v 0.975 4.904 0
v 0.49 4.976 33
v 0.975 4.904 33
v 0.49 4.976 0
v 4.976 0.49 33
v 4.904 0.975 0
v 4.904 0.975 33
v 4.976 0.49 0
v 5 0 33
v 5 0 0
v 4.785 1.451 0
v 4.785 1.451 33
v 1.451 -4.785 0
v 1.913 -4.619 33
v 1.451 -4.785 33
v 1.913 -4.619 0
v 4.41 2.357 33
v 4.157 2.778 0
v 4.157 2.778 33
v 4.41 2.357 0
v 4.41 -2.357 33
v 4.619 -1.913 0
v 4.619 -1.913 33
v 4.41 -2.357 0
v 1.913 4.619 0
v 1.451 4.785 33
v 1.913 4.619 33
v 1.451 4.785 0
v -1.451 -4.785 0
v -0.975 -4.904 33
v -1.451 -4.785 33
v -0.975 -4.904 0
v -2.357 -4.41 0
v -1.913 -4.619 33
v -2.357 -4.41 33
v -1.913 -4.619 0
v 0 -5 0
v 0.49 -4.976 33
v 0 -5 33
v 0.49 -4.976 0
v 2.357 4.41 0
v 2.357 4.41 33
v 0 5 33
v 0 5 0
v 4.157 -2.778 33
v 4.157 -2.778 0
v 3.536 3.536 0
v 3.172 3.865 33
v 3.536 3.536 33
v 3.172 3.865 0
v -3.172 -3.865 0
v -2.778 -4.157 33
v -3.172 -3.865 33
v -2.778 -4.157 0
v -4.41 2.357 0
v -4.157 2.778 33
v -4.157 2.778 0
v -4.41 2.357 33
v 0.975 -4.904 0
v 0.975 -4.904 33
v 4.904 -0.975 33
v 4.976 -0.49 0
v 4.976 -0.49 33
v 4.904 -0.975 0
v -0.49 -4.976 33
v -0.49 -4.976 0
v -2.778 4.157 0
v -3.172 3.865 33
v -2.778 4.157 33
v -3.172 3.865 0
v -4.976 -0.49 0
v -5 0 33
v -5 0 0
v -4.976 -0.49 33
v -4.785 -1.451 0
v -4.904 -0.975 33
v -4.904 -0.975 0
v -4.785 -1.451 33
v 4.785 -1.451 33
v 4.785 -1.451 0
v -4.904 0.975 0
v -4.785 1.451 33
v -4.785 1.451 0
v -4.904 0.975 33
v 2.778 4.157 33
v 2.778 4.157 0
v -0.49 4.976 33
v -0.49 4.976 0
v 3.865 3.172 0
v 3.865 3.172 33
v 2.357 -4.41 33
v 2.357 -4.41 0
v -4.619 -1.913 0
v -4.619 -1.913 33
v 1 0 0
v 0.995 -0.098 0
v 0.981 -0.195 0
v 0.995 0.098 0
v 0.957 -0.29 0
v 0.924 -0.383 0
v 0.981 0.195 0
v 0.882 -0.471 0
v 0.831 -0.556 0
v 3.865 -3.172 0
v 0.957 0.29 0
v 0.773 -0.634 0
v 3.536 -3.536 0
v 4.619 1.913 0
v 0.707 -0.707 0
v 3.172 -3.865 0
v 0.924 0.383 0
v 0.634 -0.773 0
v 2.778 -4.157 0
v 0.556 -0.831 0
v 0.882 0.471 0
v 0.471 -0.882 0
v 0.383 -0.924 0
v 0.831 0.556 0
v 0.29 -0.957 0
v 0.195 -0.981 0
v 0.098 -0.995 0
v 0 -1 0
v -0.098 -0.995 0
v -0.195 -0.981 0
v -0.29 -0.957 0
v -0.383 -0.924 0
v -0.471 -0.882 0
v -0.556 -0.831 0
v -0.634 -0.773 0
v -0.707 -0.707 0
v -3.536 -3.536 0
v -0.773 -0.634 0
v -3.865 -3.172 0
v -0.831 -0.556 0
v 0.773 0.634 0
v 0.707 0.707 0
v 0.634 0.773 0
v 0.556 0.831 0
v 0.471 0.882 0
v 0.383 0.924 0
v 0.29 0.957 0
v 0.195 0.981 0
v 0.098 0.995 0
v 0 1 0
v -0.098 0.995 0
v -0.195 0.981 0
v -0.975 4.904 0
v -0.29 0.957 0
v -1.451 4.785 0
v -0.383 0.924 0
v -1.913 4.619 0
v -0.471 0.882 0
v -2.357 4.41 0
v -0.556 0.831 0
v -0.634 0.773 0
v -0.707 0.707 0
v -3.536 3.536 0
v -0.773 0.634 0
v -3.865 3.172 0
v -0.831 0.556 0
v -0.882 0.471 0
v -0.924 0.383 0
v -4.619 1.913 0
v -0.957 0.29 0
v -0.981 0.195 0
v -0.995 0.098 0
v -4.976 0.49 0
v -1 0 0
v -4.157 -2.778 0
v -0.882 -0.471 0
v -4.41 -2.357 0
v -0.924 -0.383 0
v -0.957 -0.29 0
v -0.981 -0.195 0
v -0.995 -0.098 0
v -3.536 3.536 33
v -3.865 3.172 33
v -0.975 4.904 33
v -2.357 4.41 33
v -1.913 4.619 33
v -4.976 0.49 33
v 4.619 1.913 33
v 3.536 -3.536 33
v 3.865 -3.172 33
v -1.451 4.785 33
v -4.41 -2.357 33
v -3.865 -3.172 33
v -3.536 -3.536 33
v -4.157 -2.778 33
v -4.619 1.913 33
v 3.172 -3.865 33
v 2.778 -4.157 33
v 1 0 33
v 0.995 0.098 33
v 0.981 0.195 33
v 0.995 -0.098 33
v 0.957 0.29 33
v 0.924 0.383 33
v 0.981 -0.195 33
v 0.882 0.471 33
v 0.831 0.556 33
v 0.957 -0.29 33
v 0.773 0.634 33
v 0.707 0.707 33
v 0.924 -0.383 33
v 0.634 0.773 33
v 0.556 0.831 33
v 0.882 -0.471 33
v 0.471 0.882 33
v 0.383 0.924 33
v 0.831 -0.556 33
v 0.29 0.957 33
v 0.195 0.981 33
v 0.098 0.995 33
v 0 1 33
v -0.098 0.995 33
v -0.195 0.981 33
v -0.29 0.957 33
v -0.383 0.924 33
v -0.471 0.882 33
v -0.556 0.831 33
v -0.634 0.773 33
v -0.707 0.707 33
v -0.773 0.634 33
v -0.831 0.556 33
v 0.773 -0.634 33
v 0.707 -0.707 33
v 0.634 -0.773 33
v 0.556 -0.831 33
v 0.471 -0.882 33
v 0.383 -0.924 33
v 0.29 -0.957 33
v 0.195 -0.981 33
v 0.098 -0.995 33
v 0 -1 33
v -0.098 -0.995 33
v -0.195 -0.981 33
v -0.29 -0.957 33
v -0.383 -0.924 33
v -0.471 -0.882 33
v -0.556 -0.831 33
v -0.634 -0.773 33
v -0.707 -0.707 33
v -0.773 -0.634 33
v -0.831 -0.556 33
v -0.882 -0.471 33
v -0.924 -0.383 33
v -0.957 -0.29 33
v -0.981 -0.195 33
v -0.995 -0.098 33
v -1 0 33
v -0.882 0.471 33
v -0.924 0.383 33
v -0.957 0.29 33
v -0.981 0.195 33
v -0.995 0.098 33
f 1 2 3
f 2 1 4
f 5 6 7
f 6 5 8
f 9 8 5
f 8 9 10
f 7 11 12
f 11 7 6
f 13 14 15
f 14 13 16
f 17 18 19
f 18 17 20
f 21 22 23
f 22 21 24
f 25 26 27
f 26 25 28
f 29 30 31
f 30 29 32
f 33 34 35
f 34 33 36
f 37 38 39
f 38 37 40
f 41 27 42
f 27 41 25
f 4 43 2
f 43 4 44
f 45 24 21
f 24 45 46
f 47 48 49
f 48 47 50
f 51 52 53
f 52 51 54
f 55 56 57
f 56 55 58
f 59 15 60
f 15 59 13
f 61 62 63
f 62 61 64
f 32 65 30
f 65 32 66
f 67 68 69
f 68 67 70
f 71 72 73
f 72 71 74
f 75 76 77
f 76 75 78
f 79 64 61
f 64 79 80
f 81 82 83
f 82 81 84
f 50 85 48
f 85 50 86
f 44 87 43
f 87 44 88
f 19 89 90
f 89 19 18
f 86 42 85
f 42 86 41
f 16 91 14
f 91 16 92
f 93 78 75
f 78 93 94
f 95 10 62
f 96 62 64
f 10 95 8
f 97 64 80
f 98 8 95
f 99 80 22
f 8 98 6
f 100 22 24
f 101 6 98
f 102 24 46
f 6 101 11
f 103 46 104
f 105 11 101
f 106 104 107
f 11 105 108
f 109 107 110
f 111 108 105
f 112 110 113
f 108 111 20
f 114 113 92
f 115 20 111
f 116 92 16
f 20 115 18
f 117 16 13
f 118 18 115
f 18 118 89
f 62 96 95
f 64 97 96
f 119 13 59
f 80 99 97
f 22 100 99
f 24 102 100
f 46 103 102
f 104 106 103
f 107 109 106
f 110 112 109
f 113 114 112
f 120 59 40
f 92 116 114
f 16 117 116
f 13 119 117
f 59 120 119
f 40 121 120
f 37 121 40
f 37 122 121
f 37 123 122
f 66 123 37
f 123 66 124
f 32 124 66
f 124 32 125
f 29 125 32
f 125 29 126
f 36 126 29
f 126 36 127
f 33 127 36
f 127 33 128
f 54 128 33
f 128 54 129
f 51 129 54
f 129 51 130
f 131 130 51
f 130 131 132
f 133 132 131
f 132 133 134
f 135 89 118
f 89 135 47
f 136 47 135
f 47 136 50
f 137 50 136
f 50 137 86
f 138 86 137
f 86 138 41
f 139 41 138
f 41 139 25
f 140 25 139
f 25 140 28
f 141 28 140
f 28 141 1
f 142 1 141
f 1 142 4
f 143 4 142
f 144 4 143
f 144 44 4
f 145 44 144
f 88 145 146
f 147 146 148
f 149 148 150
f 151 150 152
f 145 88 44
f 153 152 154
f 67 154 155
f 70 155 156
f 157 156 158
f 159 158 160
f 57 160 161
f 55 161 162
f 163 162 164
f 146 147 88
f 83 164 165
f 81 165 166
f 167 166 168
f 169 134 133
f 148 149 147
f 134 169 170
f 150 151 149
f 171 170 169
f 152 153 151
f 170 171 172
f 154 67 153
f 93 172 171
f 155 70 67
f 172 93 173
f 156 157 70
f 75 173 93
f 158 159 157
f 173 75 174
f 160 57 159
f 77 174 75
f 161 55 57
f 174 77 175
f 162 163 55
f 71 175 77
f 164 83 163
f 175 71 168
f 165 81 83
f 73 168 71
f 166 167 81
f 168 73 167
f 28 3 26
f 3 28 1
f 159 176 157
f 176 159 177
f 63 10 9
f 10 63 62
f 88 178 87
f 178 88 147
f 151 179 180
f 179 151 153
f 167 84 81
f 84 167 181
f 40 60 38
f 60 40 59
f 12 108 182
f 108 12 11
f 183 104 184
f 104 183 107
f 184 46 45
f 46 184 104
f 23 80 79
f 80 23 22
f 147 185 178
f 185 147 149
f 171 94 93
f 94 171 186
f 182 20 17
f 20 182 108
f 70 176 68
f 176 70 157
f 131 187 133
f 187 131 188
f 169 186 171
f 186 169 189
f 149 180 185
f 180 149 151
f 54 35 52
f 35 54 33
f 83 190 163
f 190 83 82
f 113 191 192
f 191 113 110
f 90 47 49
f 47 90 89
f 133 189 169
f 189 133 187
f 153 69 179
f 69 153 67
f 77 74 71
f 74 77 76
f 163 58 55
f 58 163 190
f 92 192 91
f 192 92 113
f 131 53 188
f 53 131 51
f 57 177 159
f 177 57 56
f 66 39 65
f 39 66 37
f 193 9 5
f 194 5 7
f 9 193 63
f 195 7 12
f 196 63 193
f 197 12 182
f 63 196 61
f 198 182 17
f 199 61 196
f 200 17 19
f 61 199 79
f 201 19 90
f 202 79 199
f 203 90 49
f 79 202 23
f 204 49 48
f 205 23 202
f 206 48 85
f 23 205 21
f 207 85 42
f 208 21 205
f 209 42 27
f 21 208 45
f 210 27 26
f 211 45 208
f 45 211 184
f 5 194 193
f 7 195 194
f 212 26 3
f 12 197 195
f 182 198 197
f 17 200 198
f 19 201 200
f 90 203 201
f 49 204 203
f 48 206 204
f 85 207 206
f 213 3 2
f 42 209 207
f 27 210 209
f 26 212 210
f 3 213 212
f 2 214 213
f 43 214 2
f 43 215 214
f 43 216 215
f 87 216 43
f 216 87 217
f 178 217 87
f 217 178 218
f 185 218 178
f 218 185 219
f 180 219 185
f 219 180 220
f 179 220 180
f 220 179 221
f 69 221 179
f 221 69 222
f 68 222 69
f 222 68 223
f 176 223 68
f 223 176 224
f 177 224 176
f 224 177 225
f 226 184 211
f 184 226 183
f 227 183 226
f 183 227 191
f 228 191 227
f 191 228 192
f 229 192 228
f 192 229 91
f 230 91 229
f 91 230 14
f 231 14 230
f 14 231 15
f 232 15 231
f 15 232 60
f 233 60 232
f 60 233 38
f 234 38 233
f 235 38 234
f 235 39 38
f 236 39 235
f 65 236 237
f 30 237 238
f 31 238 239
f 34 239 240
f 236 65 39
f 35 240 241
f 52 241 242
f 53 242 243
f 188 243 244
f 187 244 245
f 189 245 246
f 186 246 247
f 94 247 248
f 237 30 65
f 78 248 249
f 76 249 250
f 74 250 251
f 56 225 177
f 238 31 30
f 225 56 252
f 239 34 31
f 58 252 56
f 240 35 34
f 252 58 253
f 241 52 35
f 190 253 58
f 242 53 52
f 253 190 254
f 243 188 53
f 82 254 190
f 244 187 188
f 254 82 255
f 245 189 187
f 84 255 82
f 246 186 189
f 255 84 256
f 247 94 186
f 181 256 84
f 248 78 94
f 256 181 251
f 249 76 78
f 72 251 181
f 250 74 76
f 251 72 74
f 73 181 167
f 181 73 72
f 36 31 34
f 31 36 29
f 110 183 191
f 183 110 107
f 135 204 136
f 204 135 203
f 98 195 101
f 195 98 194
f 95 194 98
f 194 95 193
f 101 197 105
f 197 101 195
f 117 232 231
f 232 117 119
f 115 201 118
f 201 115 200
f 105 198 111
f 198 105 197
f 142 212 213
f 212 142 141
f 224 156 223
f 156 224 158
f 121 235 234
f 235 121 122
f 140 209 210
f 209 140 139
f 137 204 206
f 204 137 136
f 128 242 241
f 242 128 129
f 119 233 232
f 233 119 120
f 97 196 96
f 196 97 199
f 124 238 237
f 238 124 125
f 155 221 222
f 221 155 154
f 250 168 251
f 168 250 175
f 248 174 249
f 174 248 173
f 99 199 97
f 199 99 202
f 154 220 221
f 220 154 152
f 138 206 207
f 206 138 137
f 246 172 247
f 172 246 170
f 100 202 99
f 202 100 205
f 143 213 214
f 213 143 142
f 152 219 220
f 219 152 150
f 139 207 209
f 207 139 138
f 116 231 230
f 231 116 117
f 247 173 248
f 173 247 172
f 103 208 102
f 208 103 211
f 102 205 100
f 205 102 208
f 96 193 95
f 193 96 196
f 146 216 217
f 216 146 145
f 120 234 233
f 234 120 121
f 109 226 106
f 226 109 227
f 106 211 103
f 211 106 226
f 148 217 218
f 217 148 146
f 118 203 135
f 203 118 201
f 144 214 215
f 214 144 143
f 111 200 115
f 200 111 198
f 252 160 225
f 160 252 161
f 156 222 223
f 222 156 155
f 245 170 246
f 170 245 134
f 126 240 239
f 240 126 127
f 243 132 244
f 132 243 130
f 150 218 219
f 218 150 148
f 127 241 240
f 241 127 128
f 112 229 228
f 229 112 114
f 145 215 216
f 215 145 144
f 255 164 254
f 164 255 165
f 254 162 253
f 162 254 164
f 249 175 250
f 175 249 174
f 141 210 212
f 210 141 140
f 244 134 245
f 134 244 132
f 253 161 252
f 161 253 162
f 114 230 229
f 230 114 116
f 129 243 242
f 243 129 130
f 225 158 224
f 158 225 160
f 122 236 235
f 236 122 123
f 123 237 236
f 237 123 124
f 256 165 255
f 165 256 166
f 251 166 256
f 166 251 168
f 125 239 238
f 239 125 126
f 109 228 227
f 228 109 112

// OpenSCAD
$fn=64;

difference() {
    cylinder(d=10,h=40-7);
    cylinder(d=2,h=40-7);
}
